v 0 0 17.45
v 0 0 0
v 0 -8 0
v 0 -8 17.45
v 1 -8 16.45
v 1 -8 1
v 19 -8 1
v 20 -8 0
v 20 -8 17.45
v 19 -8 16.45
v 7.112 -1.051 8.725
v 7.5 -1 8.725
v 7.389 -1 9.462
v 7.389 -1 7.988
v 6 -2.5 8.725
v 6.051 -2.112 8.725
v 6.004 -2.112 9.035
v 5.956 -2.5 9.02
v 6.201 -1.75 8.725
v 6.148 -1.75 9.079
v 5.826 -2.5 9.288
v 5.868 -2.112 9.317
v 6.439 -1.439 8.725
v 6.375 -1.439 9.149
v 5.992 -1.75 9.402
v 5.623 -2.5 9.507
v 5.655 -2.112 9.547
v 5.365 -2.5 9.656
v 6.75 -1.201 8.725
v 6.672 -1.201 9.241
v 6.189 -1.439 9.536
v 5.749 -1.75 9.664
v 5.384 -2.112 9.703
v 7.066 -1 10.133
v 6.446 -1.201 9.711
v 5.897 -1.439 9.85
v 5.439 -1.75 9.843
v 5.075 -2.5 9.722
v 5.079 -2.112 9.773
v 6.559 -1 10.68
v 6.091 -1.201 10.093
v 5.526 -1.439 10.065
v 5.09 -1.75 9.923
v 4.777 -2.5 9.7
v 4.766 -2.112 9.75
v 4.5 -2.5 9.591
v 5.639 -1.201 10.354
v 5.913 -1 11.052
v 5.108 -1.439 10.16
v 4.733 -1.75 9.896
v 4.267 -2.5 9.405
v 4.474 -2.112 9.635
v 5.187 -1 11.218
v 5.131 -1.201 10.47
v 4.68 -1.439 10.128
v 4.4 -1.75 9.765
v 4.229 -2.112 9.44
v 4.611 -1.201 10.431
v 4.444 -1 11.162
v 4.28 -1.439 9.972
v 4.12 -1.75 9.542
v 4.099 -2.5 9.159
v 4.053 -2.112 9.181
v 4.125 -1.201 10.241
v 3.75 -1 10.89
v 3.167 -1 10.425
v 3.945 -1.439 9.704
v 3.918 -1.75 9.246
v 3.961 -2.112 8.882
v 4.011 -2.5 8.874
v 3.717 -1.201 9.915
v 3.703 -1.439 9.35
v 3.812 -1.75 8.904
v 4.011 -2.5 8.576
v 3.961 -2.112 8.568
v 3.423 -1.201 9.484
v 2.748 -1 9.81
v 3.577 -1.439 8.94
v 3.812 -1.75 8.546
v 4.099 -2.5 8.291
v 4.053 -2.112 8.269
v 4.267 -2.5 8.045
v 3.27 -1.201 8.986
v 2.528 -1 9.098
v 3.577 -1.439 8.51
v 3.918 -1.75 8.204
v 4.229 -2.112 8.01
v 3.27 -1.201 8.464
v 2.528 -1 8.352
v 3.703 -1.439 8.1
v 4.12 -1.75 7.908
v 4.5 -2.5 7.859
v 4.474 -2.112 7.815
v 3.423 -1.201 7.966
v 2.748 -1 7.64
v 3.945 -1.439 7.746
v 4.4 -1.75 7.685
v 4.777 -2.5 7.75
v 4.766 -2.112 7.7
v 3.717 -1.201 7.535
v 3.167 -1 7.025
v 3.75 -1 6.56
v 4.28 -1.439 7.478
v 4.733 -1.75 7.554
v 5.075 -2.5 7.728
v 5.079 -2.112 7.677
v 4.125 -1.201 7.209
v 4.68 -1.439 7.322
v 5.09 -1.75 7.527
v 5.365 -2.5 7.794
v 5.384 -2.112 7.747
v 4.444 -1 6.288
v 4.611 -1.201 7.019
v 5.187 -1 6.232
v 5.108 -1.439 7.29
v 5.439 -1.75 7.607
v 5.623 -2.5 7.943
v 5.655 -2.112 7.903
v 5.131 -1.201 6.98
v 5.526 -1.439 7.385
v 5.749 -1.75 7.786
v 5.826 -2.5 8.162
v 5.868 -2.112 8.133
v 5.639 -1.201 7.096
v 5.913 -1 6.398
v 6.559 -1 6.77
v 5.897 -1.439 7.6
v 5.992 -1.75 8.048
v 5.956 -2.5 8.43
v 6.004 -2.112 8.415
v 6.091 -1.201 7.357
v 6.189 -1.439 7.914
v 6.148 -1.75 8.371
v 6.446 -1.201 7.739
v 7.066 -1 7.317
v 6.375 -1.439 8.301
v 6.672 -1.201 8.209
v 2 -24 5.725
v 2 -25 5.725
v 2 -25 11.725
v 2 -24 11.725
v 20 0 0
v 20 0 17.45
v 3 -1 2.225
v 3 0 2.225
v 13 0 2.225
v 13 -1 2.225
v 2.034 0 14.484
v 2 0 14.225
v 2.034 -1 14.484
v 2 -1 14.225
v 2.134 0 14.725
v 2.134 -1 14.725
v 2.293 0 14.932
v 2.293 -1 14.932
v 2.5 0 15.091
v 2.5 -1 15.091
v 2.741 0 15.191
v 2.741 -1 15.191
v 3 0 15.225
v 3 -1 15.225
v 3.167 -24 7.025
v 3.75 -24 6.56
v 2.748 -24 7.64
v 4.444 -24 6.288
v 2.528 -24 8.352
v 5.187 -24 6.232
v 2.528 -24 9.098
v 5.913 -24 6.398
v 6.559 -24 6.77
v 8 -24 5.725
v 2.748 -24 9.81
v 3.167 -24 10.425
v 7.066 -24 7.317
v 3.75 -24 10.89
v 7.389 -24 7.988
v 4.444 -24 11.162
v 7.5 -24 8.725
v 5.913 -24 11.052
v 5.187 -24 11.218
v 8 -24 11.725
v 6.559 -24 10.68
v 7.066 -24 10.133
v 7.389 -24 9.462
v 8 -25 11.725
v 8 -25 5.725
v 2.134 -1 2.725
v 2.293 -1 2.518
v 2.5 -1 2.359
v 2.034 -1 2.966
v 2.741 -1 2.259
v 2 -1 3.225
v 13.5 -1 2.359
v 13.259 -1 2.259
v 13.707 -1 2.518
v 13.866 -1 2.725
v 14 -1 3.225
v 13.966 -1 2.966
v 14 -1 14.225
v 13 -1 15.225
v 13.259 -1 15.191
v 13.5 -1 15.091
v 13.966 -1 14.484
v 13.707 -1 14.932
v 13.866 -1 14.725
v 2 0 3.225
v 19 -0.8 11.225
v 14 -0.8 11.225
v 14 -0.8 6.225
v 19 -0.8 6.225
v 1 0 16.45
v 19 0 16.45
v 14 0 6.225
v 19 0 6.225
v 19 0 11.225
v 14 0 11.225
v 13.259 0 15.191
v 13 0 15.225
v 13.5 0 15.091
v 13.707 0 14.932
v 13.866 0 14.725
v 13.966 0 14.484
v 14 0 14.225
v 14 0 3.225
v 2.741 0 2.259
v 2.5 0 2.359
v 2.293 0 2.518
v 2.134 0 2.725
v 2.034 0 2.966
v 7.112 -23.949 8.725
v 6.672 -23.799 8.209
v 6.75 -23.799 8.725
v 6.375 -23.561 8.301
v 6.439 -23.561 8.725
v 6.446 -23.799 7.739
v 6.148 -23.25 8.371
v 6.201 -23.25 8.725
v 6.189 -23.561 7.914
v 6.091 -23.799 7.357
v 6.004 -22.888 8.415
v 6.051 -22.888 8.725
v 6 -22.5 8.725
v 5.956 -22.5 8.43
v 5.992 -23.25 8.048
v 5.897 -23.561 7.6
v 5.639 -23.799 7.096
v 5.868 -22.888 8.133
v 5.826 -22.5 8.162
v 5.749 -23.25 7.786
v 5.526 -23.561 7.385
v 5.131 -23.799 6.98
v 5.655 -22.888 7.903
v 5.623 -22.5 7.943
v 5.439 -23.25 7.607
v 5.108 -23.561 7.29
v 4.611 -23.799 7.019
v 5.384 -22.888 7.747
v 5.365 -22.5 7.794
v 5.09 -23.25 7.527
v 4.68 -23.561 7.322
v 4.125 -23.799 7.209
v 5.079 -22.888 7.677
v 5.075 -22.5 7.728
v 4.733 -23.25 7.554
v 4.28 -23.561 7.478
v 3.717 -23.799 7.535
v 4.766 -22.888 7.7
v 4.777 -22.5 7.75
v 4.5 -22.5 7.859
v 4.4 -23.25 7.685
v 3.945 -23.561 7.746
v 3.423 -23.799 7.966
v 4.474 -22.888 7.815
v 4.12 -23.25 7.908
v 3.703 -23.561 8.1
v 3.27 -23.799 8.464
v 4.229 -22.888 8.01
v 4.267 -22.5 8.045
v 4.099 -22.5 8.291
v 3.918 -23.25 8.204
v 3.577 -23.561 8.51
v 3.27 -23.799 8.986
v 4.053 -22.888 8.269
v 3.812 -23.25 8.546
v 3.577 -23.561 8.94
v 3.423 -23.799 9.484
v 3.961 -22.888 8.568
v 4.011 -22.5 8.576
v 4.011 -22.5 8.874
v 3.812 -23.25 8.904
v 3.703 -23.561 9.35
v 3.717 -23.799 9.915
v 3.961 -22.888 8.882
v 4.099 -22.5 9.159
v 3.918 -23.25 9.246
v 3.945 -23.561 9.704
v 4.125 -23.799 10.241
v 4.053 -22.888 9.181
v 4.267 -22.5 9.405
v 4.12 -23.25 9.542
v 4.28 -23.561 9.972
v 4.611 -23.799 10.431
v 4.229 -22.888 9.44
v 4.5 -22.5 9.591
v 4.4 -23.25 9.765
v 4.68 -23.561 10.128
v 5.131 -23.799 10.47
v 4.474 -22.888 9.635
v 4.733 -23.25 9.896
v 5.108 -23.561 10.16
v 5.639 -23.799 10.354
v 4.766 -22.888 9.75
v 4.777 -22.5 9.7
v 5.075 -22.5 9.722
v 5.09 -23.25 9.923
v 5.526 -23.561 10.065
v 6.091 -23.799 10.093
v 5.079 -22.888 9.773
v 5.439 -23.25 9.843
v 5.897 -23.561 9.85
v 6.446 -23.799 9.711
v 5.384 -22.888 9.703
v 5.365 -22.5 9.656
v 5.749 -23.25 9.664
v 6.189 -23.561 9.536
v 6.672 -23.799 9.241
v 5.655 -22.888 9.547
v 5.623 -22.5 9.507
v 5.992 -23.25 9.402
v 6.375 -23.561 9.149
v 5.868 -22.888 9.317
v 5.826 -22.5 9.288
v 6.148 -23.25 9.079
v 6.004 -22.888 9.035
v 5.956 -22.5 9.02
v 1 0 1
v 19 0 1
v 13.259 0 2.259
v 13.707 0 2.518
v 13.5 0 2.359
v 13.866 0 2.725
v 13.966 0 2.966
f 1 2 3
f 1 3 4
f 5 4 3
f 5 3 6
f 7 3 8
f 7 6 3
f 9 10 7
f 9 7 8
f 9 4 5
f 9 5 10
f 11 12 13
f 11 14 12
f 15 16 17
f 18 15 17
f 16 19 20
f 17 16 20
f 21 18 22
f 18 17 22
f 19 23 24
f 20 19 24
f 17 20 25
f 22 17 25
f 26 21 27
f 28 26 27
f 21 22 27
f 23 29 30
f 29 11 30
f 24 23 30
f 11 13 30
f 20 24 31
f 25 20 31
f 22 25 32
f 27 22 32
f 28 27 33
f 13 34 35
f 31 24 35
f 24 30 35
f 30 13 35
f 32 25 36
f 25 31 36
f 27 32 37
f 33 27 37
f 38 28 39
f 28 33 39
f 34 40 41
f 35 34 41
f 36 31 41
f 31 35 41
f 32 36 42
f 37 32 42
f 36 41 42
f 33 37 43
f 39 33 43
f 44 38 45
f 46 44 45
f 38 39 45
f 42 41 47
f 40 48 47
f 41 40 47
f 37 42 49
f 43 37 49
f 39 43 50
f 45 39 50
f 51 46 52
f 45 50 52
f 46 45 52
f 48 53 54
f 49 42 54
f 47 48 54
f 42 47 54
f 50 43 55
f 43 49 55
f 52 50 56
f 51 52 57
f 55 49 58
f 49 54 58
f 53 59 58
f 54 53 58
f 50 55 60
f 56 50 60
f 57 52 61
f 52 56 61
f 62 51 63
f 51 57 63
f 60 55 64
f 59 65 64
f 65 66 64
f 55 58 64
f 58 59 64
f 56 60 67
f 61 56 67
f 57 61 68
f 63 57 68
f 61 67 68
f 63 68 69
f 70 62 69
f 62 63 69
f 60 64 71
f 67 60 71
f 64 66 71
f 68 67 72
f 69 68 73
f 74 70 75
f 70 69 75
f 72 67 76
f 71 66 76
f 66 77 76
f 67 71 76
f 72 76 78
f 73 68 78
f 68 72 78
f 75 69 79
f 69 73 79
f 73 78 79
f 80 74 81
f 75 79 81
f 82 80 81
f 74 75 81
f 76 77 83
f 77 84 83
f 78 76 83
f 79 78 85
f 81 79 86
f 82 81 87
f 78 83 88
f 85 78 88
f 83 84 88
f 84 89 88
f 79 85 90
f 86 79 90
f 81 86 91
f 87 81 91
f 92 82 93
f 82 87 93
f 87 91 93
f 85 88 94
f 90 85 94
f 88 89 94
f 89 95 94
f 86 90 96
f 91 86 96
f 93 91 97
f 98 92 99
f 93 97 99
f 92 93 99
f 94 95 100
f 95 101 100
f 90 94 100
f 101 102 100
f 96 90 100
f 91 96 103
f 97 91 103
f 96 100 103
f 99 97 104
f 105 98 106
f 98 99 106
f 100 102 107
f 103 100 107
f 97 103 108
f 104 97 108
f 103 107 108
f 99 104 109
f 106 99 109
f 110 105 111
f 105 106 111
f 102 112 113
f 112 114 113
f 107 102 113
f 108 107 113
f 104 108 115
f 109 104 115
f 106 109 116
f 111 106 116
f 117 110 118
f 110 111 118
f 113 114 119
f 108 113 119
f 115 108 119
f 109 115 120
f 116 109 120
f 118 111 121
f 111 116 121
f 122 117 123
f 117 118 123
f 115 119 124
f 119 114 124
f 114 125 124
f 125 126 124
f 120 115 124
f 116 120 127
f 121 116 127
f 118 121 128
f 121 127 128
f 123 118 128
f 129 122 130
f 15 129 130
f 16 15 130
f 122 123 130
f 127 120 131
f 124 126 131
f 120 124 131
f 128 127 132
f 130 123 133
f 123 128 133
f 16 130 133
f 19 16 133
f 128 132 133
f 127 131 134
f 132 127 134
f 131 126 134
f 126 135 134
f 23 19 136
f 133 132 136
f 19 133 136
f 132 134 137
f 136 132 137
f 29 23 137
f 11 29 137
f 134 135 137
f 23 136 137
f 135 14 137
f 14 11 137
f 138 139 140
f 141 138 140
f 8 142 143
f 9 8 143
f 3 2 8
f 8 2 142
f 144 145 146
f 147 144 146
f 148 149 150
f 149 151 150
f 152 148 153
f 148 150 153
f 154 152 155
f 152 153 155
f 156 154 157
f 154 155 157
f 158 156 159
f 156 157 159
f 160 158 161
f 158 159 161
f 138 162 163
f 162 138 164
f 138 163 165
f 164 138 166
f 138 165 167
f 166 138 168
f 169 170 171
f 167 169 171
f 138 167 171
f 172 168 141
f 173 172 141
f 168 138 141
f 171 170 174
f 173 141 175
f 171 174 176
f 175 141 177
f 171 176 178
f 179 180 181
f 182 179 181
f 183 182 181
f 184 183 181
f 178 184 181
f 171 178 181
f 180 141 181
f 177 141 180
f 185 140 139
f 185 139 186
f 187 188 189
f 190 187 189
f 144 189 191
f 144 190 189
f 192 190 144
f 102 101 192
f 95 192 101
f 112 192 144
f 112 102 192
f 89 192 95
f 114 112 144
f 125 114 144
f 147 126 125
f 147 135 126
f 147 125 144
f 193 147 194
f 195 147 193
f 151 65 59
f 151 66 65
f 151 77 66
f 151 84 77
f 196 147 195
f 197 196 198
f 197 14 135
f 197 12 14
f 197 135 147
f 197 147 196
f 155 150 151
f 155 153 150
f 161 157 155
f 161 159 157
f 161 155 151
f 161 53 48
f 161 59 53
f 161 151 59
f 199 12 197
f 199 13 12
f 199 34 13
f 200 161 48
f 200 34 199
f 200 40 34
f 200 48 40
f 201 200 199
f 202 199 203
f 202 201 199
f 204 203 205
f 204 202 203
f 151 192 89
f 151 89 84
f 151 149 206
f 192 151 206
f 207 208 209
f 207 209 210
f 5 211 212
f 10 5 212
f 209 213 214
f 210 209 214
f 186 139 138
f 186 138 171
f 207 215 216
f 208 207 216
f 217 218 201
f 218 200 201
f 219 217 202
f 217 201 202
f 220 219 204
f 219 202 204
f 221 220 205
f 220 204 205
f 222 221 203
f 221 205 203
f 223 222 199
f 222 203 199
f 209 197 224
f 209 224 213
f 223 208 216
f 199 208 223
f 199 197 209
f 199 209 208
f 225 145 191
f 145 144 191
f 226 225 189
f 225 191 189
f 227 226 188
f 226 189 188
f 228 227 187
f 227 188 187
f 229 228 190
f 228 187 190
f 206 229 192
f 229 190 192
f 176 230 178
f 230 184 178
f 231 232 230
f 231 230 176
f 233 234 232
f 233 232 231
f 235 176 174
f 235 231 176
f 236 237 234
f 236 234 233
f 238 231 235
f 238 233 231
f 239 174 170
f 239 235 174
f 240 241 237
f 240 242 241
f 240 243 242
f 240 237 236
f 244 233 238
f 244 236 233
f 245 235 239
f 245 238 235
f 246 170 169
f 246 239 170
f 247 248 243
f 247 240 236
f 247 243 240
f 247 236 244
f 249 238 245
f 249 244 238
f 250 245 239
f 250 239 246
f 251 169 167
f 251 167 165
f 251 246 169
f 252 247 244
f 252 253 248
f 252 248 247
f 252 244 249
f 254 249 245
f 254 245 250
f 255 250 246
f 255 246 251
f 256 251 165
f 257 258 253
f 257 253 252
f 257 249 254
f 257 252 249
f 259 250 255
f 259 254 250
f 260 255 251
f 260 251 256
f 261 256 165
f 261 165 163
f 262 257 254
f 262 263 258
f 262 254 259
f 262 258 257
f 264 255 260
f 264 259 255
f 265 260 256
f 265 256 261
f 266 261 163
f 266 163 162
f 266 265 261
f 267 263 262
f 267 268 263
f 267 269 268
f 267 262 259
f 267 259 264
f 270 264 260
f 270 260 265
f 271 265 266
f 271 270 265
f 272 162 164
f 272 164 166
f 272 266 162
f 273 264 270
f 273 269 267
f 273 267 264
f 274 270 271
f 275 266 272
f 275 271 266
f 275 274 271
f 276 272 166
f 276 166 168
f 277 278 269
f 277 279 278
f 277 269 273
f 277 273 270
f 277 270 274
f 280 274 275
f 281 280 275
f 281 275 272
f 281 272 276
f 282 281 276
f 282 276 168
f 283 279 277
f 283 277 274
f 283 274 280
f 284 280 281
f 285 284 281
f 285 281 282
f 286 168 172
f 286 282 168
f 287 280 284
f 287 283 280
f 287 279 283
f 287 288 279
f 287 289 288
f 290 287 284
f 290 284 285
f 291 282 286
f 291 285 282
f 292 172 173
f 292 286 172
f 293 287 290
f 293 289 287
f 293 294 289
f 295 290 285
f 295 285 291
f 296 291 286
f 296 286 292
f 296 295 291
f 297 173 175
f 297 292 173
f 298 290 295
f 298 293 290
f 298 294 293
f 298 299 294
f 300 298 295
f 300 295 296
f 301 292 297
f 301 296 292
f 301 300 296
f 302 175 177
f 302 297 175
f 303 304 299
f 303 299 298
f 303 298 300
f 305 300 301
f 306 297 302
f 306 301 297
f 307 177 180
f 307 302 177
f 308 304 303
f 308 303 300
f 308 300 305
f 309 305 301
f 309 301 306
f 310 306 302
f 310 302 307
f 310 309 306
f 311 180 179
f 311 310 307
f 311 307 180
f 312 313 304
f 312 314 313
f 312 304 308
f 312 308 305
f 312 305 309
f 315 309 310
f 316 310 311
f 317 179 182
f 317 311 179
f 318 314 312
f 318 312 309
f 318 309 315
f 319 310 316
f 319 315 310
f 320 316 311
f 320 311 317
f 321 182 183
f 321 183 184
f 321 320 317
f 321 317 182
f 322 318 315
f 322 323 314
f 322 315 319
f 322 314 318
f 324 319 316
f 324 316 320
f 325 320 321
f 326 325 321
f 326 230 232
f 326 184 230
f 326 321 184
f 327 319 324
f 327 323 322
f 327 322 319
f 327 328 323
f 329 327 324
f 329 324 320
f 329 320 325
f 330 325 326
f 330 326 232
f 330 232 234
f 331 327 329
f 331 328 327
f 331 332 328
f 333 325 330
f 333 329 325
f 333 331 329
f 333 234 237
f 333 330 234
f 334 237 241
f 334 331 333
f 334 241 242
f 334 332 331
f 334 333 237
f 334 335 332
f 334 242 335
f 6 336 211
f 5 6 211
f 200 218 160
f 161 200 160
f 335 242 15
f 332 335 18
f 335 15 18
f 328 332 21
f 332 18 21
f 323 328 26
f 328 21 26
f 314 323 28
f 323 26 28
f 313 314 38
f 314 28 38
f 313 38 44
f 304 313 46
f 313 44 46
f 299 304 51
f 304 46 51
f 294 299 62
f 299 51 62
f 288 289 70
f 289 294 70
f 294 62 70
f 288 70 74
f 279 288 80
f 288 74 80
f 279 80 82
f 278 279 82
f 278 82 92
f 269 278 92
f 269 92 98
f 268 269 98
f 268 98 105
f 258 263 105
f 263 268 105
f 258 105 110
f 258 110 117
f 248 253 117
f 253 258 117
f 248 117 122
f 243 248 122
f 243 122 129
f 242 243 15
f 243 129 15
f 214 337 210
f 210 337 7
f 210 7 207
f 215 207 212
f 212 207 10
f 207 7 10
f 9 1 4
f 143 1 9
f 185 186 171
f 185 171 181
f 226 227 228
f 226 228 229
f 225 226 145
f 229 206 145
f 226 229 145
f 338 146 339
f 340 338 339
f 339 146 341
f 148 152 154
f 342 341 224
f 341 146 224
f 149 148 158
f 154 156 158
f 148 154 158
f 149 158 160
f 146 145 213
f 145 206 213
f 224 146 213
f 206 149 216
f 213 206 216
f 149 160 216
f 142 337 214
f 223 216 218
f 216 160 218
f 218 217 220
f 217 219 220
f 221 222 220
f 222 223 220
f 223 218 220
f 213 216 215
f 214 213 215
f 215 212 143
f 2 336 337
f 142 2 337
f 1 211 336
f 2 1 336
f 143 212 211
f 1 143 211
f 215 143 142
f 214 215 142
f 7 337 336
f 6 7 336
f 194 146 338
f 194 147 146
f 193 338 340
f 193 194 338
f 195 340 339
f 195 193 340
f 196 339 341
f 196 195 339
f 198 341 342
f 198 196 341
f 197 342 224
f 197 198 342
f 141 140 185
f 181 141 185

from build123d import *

# Parameters (mm, degrees)
F0_W     = 20
F0_H     = 17.45
F1_DEPTH = 8
F0_W_2   = 6
F0_H_2   = 6
F0_R     = 1
F2_DEPTH = 1
F3_DEPTH = 25
F4_W     = 6
F4_H     = 6
F5_DEPTH = 1
F6_R     = 1.5
F7_W     = 5
F7_H     = 5
F8_DEPTH = 0.2
F9_R     = 1


with BuildPart() as f1:
    # F0 (on Front) → F1 (new body)
    with BuildSketch(Plane.XZ):
        with Locations((10, 8.725)):
            Rectangle(F0_W, F0_H)
        Polygon((19, 16.45), (19, 11.225), (19, 6.225), (19, 1), (1, 1), (1, 16.45), align=None, mode=Mode.SUBTRACT)
    extrude(amount=F1_DEPTH)

    # F0 (on Front) → F2 (join)
    with BuildSketch(Plane.XZ):
        Polygon((19, 11.225), (14, 11.225), (14, 15.225), (2, 15.225), (2, 11.725), (8, 11.725), (8, 5.725), (2, 5.725), (2, 2.225), (14, 2.225), (14, 6.225), (19, 6.225), align=None)
        with Locations((5, 8.725)):
            Rectangle(F0_W_2, F0_H_2)
        with Locations((5, 8.725)):
            Circle(F0_R, mode=Mode.SUBTRACT)
    extrude(amount=F2_DEPTH)

    # F0 (on Front) → F3 (join)
    with BuildSketch(Plane.XZ):
        with Locations((5, 8.725)):
            Circle(F0_R)
    extrude(amount=F3_DEPTH)

    # F4 (on face) → F5 (join)
    with BuildSketch(Plane.XZ.offset(25)):
        with Locations((5, 8.725)):
            Rectangle(F4_W, F4_H)
    extrude(amount=-F5_DEPTH)

    # F6
    f6_edges = [f1.edges().sort_by_distance(p)[0] for p in [
        (4, -24, 8.725),
        (4, -1, 8.725),
    ]]
    fillet(f6_edges, radius=F6_R)

    # F7 (on face) → F8 (cut)
    with BuildSketch(Plane.XZ.offset(1)):
        with Locations((16.5, 8.725)):
            Rectangle(F7_W, F7_H)
    extrude(amount=-F8_DEPTH, mode=Mode.SUBTRACT)

    # F9
    f9_edges = [f1.edges().sort_by_distance(p)[0] for p in [
        (2, -0.5, 15.225),
        (14, -0.5, 15.225),
        (2, -0.5, 2.225),
        (14, -0.5, 2.225),
    ]]
    fillet(f9_edges, radius=F9_R)


solid = f1.part
